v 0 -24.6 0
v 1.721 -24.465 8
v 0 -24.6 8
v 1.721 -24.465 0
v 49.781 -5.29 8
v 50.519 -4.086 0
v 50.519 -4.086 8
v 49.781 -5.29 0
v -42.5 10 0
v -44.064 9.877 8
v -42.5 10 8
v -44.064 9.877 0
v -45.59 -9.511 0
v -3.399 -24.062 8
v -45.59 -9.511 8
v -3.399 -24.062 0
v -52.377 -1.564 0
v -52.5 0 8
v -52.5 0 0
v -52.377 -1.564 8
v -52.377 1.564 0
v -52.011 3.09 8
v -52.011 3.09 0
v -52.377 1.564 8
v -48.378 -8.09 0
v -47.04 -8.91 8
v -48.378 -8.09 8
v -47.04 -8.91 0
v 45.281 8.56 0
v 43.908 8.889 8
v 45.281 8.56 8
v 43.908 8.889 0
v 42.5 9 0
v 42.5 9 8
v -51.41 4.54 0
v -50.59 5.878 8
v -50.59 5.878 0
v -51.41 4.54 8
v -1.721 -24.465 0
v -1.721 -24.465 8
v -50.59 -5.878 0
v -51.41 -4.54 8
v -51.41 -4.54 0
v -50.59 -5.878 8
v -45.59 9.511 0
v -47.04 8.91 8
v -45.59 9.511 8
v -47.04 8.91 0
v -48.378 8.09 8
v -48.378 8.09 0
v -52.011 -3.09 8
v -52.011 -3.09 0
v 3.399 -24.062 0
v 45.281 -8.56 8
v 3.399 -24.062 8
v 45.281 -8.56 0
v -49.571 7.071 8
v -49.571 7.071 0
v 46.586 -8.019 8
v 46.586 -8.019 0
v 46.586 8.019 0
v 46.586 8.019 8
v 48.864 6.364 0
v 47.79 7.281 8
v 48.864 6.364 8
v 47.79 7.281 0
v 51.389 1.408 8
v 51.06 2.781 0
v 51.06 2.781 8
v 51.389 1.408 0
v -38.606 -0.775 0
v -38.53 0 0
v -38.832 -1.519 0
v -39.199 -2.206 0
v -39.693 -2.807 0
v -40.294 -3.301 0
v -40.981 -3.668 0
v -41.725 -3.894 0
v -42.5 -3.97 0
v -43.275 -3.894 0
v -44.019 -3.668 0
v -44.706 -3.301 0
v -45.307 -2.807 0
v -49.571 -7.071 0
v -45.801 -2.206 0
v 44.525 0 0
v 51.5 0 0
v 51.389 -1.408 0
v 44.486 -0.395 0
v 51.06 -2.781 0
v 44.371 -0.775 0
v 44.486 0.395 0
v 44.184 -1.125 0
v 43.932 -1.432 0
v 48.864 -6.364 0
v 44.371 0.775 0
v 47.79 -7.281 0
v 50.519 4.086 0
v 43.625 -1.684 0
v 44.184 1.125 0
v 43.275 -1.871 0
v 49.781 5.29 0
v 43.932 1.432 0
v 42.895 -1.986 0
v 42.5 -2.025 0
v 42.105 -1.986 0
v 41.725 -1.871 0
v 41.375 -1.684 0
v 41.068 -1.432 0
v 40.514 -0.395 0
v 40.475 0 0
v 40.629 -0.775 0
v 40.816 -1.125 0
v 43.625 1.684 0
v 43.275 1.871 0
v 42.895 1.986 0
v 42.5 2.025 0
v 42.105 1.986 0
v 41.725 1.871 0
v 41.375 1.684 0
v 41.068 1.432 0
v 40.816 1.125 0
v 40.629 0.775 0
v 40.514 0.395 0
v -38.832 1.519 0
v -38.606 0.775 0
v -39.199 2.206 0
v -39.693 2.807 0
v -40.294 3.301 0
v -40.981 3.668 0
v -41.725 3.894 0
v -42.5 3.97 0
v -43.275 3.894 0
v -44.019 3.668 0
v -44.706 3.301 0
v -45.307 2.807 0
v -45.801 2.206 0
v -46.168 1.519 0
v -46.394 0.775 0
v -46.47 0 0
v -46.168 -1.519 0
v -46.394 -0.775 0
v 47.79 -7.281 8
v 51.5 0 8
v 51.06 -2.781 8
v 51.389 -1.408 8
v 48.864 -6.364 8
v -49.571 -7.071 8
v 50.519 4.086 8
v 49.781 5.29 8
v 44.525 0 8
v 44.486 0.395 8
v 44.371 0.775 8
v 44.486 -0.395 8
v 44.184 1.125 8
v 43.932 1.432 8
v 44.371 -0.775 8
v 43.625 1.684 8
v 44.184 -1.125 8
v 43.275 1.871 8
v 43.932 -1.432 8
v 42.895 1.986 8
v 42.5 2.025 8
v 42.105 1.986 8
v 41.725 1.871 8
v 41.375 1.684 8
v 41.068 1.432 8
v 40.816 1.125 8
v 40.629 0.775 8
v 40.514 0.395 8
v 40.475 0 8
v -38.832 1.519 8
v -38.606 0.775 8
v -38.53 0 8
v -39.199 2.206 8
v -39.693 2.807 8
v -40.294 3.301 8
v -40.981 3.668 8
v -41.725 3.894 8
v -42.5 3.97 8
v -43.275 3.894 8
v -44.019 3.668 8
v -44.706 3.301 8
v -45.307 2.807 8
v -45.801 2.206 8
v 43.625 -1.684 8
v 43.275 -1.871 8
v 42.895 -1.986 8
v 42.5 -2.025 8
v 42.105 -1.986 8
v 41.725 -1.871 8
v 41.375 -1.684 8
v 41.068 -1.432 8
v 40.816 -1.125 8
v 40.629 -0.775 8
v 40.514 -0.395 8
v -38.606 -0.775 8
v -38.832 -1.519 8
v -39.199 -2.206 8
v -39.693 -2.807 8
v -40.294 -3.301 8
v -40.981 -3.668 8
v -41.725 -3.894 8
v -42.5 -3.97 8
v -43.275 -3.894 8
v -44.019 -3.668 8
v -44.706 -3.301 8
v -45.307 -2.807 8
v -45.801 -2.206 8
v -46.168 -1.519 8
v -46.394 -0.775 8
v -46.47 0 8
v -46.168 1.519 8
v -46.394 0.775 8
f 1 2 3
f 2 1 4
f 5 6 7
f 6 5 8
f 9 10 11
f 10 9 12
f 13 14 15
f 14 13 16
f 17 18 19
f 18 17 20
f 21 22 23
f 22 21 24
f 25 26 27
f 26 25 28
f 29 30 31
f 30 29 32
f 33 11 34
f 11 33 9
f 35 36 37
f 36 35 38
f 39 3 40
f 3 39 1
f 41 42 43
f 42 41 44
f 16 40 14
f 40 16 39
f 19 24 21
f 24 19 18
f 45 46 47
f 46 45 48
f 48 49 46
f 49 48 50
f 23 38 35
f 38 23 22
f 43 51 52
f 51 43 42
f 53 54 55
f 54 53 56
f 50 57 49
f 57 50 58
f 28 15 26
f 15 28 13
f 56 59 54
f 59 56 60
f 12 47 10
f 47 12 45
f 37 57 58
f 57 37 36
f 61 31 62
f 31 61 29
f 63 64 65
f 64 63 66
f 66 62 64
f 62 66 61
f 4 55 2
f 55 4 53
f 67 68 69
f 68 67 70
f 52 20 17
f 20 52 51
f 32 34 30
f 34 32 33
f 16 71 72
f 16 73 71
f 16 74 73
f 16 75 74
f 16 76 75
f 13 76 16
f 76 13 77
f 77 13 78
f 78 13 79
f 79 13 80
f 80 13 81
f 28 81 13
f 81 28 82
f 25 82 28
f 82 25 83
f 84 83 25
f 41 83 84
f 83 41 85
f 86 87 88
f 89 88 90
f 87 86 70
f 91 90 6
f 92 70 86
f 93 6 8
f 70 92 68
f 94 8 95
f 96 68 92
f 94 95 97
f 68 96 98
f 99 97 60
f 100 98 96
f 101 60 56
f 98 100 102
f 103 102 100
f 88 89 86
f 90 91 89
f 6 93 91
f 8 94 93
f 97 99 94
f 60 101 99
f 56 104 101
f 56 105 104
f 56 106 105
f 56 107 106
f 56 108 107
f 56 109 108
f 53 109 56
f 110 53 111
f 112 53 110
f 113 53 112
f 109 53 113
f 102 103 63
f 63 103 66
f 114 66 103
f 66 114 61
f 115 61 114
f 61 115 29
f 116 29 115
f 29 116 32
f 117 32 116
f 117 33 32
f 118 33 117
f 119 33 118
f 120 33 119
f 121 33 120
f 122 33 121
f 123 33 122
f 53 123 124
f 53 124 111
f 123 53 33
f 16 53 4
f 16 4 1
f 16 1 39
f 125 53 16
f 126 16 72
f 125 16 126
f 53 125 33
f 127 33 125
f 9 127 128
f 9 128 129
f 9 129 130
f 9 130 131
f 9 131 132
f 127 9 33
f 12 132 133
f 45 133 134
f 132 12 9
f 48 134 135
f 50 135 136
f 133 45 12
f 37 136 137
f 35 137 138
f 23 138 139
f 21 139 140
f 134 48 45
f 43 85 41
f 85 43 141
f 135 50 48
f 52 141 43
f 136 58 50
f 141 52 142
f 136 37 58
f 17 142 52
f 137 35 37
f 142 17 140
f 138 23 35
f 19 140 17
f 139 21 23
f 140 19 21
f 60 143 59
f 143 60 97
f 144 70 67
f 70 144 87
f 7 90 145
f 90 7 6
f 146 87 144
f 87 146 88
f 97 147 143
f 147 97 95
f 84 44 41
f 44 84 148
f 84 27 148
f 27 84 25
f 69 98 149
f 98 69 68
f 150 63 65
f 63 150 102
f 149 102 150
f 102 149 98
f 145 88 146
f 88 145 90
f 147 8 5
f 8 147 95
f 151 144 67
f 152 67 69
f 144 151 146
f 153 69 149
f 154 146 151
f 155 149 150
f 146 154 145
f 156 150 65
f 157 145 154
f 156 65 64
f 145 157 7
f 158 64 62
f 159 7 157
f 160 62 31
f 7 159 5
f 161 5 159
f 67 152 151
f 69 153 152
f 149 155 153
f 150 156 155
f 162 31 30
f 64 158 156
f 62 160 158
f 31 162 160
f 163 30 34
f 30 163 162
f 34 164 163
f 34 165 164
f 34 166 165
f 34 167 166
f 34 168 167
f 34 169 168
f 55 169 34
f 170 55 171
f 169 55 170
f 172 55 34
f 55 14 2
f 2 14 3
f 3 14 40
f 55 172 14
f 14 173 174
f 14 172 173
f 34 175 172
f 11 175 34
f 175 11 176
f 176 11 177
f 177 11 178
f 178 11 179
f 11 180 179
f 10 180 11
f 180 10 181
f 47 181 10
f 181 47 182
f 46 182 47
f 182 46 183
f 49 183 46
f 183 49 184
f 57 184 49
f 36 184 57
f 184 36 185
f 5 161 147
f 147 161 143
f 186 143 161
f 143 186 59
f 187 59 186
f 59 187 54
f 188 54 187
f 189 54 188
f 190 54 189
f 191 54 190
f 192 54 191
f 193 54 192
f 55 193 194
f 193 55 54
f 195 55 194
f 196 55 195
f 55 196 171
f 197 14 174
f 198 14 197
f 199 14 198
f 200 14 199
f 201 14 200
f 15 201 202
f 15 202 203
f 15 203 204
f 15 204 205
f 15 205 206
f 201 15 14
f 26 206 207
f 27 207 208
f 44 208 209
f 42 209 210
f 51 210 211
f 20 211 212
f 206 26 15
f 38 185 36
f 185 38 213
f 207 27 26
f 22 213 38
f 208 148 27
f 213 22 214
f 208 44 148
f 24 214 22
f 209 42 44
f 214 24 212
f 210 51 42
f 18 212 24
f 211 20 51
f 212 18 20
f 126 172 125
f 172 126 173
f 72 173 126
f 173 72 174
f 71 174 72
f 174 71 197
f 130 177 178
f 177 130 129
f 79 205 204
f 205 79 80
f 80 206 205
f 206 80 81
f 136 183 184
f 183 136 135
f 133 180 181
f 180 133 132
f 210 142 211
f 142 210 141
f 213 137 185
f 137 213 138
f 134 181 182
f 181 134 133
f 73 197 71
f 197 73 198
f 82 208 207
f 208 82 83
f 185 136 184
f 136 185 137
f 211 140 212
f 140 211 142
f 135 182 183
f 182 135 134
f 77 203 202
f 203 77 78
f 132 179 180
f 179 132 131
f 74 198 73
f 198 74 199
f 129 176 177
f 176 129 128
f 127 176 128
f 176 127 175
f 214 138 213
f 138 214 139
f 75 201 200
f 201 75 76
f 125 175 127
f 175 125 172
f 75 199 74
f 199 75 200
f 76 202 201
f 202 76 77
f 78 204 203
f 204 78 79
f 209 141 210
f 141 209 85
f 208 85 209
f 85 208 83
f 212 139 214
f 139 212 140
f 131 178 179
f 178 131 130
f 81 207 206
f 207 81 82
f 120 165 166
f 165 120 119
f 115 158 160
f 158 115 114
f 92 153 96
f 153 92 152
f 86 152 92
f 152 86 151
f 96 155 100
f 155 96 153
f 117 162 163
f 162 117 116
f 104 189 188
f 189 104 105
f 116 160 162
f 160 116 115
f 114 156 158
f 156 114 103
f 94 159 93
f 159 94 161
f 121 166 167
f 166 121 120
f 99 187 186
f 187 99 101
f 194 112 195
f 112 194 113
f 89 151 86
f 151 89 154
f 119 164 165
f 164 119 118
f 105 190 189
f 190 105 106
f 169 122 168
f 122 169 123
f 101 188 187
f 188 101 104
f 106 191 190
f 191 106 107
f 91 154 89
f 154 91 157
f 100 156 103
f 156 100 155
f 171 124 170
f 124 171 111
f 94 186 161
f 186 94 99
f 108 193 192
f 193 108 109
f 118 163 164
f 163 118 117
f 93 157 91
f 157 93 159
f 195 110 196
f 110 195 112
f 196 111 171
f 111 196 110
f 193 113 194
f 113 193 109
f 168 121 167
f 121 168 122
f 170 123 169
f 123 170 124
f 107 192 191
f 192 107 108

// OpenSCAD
$fn = 32;

// ----------------------------------------------------------------------
// Lever: 85 mm between the bosses, 8 mm thick, smooth outline
// ----------------------------------------------------------------------

// --- parameters (mm) ---
lever_l = 85;             // distance between the boss centres
boss_a = 20;              // first boss diameter
boss_b = 18;              // second boss diameter
bore_a = 7.94;            // first bore
bore_b = 4.05;            // second bore
lever_t = 8;              // lever thickness
boss_c = 22;              // middle boss diameter
bend = 13.6;              // how far the middle boss drops

lever_profile = [[-52.5, 0], [-52.377, -1.564], [-52.011, -3.09], [-51.41, -4.54], [-50.59, -5.878], [-49.571, -7.071], [-48.378, -8.09], [-47.04, -8.91], [-45.59, -9.511], [-3.399, -24.062], [-1.721, -24.465], [0, -24.6], [1.721, -24.465], [3.399, -24.062], [45.281, -8.56], [46.586, -8.019], [47.79, -7.281], [48.864, -6.364], [49.781, -5.29], [50.519, -4.086], [51.06, -2.781], [51.389, -1.408], [51.5, 0], [51.389, 1.408], [51.06, 2.781], [50.519, 4.086], [49.781, 5.29], [48.864, 6.364], [47.79, 7.281], [46.586, 8.019], [45.281, 8.56], [43.908, 8.889], [42.5, 9], [-42.5, 10], [-44.064, 9.877], [-45.59, 9.511], [-47.04, 8.91], [-48.378, 8.09], [-49.571, 7.071], [-50.59, 5.878], [-51.41, 4.54], [-52.011, 3.09], [-52.377, 1.564]];

difference() {
  linear_extrude(height = lever_t) polygon(lever_profile);
  translate([-42.5, 0, -2.5]) cylinder(h = lever_t + 5, d = bore_a);
  translate([42.5, 0, -2.5]) cylinder(h = lever_t + 5, d = bore_b);
}
